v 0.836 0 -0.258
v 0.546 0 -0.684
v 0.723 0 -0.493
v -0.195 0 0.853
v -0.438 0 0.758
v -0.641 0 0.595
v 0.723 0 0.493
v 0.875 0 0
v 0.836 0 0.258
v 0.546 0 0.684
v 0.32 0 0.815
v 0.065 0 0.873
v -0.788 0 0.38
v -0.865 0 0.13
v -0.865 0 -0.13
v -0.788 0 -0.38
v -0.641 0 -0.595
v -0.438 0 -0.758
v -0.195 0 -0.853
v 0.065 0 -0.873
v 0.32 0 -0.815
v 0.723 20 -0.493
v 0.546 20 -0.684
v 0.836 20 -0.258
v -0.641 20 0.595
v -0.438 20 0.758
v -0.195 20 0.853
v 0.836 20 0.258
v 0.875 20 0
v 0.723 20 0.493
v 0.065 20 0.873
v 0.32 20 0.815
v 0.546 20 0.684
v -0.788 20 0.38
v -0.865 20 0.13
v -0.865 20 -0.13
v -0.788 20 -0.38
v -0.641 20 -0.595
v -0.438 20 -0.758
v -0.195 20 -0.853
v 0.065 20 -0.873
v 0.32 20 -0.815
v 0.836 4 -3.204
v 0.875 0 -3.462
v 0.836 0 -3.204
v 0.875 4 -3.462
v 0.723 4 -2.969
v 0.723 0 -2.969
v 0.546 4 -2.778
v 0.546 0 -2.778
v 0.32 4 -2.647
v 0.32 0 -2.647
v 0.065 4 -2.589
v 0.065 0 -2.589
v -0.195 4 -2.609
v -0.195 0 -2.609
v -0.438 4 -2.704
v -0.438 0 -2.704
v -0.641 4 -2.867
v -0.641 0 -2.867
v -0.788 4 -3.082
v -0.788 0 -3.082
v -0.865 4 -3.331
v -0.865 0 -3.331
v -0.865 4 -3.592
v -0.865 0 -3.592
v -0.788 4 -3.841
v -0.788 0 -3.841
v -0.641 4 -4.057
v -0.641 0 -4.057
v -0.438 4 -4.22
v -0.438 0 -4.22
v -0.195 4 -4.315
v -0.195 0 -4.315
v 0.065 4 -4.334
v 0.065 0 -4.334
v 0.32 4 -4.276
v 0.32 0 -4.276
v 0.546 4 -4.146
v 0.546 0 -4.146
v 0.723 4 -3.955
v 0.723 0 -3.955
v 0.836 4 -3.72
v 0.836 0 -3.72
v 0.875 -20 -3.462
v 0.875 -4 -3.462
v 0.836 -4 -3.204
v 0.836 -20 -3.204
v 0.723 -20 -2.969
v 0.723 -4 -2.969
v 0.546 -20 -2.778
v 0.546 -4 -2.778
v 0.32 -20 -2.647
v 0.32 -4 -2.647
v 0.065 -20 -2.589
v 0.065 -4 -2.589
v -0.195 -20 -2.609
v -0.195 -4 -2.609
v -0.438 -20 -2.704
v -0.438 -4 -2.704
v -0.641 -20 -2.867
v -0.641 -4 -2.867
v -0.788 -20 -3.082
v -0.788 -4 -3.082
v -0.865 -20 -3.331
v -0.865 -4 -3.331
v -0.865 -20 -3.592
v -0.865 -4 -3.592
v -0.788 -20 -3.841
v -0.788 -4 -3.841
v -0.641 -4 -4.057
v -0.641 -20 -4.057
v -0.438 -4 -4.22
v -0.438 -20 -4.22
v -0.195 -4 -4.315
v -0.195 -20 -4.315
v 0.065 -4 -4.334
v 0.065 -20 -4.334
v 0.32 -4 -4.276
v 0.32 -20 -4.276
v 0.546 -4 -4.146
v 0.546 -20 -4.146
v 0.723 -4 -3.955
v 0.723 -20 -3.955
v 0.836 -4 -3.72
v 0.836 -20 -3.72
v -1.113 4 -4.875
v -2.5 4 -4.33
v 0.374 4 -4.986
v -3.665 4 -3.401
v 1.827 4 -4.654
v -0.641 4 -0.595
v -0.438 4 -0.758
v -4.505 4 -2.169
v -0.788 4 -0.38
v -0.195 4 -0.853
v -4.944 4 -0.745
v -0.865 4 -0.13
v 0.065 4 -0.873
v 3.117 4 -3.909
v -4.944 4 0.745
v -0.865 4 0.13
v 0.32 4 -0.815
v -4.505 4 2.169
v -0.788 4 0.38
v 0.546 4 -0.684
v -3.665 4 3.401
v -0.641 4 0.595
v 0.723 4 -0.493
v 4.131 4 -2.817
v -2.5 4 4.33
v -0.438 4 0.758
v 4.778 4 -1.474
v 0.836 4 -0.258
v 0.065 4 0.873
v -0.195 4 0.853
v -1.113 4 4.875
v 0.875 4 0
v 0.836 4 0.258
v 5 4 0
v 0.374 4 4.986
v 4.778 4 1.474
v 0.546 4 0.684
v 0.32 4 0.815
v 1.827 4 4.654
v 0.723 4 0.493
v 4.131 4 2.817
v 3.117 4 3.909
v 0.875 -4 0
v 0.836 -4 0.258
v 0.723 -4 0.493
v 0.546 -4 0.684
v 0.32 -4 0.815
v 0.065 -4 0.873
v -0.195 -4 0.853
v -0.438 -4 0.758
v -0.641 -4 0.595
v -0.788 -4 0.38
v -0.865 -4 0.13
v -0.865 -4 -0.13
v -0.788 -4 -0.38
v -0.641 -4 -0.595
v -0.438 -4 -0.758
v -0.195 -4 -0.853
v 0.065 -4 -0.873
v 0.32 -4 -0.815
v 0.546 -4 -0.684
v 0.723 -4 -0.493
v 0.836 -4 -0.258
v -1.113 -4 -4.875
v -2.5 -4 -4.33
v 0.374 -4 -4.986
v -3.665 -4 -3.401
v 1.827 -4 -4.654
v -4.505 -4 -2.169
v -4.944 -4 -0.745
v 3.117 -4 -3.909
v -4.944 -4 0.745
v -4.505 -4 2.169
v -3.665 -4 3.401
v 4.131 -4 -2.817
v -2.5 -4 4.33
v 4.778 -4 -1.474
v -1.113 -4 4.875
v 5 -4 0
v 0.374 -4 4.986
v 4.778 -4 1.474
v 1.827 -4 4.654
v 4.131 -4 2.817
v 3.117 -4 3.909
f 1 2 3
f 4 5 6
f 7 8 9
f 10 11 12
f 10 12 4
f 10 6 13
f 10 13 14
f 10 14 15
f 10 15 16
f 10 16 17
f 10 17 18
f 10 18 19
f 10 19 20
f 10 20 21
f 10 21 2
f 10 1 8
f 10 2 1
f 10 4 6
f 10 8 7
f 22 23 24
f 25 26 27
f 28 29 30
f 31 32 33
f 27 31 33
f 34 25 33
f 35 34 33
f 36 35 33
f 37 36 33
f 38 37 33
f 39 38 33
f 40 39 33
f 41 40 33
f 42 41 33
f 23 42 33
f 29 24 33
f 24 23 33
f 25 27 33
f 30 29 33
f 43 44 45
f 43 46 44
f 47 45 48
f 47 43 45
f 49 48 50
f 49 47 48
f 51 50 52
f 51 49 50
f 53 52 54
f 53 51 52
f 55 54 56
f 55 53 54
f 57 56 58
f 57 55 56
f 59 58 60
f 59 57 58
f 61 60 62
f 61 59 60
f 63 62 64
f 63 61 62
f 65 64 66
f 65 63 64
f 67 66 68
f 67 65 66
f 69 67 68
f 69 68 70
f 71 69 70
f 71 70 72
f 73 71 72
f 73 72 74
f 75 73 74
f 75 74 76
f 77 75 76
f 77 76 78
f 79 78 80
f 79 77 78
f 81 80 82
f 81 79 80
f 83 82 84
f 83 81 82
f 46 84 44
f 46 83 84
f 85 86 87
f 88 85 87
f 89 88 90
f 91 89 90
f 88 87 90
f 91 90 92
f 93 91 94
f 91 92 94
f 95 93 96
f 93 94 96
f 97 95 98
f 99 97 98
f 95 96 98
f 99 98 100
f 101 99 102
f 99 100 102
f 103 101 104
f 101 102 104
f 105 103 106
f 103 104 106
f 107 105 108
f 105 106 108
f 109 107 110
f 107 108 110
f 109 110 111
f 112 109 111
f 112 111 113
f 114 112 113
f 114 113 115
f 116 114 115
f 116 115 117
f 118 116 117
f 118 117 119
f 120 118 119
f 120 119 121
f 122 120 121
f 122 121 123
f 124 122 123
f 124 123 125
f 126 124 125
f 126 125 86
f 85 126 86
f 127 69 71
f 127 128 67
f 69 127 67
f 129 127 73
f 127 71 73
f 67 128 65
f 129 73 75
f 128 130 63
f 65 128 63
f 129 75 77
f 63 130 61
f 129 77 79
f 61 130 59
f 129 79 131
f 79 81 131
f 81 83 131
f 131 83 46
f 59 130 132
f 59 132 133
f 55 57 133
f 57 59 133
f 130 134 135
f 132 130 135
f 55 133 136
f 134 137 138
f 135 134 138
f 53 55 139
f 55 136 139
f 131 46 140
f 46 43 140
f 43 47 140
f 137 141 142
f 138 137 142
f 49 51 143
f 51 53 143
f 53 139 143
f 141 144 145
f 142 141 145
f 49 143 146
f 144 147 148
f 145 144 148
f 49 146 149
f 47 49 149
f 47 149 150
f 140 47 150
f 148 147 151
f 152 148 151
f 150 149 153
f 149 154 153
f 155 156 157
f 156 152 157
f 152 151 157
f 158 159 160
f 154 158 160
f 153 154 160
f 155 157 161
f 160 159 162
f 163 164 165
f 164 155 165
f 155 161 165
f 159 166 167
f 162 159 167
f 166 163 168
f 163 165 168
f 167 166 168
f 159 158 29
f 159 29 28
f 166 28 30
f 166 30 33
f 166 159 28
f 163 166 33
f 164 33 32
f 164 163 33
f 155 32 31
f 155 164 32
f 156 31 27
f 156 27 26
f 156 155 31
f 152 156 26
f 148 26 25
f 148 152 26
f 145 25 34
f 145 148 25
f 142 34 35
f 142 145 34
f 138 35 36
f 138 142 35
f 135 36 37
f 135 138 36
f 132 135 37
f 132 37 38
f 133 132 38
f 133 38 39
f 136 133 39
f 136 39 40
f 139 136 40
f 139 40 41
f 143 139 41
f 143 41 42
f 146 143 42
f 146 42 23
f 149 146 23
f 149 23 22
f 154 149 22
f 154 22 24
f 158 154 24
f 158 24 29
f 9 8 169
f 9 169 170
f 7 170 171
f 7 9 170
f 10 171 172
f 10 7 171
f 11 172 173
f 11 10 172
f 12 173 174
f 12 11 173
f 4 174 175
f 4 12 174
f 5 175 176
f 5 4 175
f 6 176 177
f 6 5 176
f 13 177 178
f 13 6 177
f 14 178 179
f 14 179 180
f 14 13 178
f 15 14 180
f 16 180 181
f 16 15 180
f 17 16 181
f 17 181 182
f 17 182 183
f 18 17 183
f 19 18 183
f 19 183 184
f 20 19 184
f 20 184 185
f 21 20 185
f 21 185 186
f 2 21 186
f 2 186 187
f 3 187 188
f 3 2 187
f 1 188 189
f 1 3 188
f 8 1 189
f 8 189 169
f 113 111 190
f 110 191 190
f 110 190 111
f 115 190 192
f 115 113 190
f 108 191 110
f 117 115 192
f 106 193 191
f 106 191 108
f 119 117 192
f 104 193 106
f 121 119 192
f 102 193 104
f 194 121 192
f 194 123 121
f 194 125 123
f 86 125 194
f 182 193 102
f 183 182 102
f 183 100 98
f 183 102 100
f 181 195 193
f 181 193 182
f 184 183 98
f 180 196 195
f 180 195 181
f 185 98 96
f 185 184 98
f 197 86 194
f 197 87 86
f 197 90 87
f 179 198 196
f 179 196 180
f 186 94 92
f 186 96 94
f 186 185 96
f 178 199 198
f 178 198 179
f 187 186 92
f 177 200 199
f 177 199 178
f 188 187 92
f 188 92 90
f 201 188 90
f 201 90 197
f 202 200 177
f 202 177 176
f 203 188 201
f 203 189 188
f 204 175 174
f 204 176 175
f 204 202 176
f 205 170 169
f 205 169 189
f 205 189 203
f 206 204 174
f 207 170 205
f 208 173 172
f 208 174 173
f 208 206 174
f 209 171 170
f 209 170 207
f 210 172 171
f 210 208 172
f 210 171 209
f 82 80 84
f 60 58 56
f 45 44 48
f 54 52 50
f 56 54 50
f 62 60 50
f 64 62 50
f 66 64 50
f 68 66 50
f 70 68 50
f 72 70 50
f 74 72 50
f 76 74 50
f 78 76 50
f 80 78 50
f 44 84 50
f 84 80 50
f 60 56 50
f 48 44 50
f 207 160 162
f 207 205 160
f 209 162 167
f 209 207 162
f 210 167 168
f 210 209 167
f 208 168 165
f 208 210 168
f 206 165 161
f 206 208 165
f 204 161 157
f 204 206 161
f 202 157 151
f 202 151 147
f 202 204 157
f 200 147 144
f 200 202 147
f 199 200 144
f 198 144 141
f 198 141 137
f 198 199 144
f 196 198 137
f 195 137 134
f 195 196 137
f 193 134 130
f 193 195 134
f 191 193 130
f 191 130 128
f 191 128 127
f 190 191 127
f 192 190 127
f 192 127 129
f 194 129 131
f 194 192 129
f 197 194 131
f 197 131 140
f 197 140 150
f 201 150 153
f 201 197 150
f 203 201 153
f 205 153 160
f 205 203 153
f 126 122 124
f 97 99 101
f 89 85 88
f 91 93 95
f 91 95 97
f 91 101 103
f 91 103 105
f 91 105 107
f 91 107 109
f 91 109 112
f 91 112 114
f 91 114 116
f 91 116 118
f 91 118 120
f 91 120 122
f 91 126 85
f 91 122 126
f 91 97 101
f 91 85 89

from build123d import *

# Parameters (mm, degrees)
F0_R     = 5
F0_R_2   = 0.875
F1_DEPTH = 4
F2_DEPTH = 20
F3_DEPTH = 20


with BuildPart() as f1:
    # F0 (on Front) → F1 (new body, symmetric)
    with BuildSketch(Plane.XZ):
        Circle(F0_R)
        with Locations((0, -3.461845)):
            Circle(F0_R_2, mode=Mode.SUBTRACT)
        Circle(F0_R_2, mode=Mode.SUBTRACT)
    extrude(amount=F1_DEPTH, both=True)

    # F0 (on Front) → F2 (join)
    with BuildSketch(Plane.XZ):
        Circle(F0_R_2)
    extrude(amount=-F2_DEPTH)

    # F0 (on Front) → F3 (join)
    with BuildSketch(Plane.XZ):
        with Locations((0, -3.461845)):
            Circle(F0_R_2)
    extrude(amount=F3_DEPTH)


solid = f1.part
